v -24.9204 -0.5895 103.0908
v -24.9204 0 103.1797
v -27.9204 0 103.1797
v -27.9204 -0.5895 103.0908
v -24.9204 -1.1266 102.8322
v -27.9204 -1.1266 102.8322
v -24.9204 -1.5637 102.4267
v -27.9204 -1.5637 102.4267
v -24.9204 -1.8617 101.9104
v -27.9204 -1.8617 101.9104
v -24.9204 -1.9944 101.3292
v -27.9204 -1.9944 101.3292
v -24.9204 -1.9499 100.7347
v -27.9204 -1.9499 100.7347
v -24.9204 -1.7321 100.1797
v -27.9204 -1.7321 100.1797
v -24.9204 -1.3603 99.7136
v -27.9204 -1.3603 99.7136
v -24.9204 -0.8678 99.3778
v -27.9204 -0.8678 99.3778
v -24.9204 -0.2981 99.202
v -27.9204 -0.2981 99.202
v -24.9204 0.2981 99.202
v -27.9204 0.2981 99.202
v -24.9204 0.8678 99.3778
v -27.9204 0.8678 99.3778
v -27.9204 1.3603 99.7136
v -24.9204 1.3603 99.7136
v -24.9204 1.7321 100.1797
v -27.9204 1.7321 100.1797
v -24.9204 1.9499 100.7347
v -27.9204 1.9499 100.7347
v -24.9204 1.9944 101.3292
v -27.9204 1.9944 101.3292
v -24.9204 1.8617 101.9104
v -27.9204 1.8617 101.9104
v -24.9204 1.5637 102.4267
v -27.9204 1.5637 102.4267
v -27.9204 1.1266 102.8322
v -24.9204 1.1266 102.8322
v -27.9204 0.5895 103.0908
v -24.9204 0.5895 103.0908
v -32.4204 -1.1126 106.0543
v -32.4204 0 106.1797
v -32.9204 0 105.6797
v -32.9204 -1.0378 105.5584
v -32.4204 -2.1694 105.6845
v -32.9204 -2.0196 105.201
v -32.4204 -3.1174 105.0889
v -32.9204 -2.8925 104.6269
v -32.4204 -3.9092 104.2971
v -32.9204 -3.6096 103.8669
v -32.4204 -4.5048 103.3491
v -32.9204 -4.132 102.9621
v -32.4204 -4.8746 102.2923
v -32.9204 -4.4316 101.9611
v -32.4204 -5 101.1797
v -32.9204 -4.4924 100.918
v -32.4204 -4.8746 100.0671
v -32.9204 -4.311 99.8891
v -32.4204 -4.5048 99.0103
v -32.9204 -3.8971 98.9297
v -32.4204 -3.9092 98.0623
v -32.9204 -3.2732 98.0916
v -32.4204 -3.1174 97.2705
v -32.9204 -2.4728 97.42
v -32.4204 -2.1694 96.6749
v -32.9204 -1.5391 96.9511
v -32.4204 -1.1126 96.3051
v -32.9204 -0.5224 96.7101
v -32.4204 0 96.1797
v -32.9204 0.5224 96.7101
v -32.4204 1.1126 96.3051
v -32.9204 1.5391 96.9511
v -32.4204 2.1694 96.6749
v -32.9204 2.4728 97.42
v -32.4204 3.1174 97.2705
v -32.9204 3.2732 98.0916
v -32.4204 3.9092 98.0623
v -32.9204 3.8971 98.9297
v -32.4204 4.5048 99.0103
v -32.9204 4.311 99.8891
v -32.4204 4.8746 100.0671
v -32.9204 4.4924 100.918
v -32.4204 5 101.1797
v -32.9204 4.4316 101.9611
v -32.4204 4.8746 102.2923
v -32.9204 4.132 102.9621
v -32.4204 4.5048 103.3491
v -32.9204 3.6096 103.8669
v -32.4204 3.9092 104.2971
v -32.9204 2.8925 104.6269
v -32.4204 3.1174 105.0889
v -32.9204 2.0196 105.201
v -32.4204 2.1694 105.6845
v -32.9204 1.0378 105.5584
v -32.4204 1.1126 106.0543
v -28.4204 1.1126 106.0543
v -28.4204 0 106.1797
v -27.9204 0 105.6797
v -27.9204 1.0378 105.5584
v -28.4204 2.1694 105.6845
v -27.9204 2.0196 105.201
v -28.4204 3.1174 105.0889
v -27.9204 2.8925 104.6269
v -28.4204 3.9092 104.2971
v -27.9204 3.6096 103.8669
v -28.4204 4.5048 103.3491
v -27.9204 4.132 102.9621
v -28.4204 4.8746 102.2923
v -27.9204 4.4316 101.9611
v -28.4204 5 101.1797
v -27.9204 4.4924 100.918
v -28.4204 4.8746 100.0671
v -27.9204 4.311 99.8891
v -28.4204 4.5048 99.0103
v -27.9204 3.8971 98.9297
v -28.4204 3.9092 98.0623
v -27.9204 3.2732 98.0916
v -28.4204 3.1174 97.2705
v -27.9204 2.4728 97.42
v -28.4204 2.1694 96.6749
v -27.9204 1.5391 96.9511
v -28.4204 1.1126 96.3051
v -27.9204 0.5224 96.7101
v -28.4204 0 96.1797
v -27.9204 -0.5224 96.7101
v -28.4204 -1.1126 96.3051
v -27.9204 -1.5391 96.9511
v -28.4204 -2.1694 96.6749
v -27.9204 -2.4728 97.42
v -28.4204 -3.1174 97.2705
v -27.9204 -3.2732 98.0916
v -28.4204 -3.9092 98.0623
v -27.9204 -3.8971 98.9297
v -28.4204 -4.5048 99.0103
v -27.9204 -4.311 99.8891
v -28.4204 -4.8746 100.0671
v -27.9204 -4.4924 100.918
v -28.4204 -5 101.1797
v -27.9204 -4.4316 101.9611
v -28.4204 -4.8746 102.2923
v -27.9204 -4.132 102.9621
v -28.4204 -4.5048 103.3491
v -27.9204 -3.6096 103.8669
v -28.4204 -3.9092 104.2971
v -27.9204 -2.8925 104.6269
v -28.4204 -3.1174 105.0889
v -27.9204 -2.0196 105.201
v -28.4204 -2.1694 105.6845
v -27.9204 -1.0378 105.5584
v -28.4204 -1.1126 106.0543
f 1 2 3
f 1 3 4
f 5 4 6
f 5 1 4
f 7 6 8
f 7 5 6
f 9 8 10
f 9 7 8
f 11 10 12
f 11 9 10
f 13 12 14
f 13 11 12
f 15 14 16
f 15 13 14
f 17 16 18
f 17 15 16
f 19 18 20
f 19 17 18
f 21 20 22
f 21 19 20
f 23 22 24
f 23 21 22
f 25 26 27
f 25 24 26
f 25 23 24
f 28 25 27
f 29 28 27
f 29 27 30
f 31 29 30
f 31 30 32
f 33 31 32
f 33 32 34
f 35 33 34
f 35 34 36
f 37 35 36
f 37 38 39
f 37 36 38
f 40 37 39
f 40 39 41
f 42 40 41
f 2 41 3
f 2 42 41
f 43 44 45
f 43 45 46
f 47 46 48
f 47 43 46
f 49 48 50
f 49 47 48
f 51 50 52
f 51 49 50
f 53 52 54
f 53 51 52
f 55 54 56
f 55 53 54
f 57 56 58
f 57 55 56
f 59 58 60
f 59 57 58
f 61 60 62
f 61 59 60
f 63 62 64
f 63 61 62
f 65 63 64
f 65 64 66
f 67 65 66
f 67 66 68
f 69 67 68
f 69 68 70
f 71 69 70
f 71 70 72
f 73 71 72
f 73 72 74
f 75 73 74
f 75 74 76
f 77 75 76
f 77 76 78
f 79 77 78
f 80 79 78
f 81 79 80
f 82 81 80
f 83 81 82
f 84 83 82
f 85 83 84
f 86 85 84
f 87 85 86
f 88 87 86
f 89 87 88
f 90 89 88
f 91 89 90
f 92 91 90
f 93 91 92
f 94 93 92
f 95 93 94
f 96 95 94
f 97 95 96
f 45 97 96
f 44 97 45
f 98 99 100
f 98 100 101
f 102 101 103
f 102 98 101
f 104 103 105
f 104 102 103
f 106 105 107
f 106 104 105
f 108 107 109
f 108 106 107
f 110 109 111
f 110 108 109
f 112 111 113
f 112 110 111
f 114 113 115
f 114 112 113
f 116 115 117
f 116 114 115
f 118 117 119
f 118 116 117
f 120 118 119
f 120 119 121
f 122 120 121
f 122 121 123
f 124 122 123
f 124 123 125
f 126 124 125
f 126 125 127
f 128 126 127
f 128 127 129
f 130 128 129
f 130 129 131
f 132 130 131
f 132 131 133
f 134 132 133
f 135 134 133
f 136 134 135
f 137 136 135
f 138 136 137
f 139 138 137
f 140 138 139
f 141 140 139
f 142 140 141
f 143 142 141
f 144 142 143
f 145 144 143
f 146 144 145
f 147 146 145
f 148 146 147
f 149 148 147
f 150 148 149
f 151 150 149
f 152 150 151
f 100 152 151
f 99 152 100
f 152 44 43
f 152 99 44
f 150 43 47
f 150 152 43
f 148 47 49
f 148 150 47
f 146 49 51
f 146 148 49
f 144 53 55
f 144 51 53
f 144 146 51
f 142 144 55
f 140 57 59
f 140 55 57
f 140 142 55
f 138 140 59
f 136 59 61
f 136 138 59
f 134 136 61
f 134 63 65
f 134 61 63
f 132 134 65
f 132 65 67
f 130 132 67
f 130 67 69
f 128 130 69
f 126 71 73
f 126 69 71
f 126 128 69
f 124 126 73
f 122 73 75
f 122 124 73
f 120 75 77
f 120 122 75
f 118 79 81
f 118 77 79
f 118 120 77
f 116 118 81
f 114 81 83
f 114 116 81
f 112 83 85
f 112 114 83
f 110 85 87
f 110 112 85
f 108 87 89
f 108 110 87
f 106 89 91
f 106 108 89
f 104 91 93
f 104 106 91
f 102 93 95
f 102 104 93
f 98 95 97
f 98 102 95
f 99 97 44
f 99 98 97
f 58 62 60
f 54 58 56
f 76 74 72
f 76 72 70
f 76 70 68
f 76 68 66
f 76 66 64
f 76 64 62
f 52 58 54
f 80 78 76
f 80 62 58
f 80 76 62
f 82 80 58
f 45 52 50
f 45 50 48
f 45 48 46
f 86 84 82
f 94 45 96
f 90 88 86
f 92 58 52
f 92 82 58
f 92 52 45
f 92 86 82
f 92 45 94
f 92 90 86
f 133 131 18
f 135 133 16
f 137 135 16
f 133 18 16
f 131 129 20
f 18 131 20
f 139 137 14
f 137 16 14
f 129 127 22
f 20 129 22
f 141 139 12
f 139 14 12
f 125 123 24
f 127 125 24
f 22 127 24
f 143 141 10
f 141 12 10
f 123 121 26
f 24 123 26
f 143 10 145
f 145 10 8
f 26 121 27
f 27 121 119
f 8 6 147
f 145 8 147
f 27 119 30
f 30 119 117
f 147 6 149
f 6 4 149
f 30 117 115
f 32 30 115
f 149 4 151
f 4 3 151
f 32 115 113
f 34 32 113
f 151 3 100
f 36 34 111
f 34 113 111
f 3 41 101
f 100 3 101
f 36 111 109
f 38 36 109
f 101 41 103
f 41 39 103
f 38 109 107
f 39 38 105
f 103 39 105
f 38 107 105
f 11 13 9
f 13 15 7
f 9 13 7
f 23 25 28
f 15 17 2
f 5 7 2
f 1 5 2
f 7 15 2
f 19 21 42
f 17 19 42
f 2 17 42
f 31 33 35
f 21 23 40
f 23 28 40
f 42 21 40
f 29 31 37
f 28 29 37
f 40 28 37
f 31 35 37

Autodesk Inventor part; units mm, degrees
ref_plane "YZ Plane" through (0, 0, 0) normal (1, 0, 0) x (0, 1, 0)
ref_plane "XZ Plane" through (0, 0, 0) normal (0, 1, 0) x (-1, 0, 0)
ref_plane "XY Plane" through (0, 0, 0) normal (0, 0, 1) x (1, 0, 0)
sketch "スケッチ1" plane through (0, 0, 0) normal (0, 1, 0) x (-1, 0, 0)
  line L0 (-5.0796, -45.5704) -> (-5.0796, 73.9296)
  line L1 (-5.0796, 73.9296) -> (-4.5796, 74.4296)
  line L2 (-4.5796, 74.4296) -> (24.4204, 74.4296)
  line L3 (24.4204, 74.4296) -> (24.9204, 73.9296)
  line L4 (24.9204, 73.9296) -> (24.9204, -45.5704)
  line L5 (24.9204, -45.5704) -> (-5.0796, -45.5704)
  line L6 (1.9204, -47.0704) -> (1.9204, -50.5704)
  line L7 (1.9204, -50.5704) -> (17.9204, -50.5704)
  line L8 (17.9204, -50.5704) -> (17.9204, -47.0704)
  line L9 (17.9204, -47.0704) -> (1.9204, -47.0704)
  line L10 (2.9204, -47.0704) -> (2.9204, -45.5704)
  line L11 (16.9204, -45.5704) -> (16.9204, -47.0704)
  line L12 (31.4204, 56.4296) -> (30.9204, 56.9296)
  line L13 (30.9204, 56.9296) -> (30.9204, 71.9296)
  line L14 (30.9204, 71.9296) -> (31.4204, 72.4296)
  line L15 (31.4204, 72.4296) -> (38.4204, 72.4296)
  line L16 (38.4204, 72.4296) -> (38.9204, 71.9296)
  line L17 (38.9204, 71.9296) -> (38.9204, 56.9296)
  line L18 (38.9204, 56.9296) -> (38.4204, 56.4296)
  line L19 (38.4204, 56.4296) -> (31.4204, 56.4296)
  line L20 (31.4204, 56.4296) -> (31.4204, 72.4296)
  line L21 (30.9204, 70.4296) -> (27.9204, 70.4296)
  line L22 (27.9204, 70.4296) -> (27.9204, 58.4296)
  line L23 (27.9204, 58.4296) -> (30.9204, 58.4296)
  line L24 (38.4204, 56.4296) -> (38.4204, 72.4296)
  line L25 (27.9204, 66.9296) -> (24.9204, 66.9296)
  line L26 (27.4204, 66.9296) -> (27.4204, 61.9296)
  line L27 (27.9204, 61.9296) -> (24.9204, 61.9296)
  line L28 (24.9204, 73.9296) -> (-5.0796, 73.9296)
  line L29 (-5.0796, 97.1797) -> (24.9204, 97.1797)
  line L30 (24.9204, 97.1797) -> (24.9204, 105.1797)
  line L31 (24.9204, 105.1797) -> (-5.0796, 105.1797)
  line L32 (-5.0796, 105.1797) -> (-5.0796, 97.1797)
  line L33 (24.9204, 99.1797) -> (27.9204, 99.1797)
  line L34 (27.2723, 99.1797) -> (27.2723, 103.1797)
  line L35 (27.9204, 103.1797) -> (24.9204, 103.1797)
  line L36 (27.9204, 105.6797) -> (27.9204, 96.6797)
  line L37 (27.9204, 96.6797) -> (28.4204, 96.1797)
  line L38 (28.4204, 96.1797) -> (32.4204, 96.1797)
  line L39 (32.4204, 96.1797) -> (32.9204, 96.6797)
  line L40 (32.9204, 96.6797) -> (32.9204, 105.6797)
  line L41 (32.9204, 105.6797) -> (32.4204, 106.1797)
  line L42 (32.4204, 106.1797) -> (28.4204, 106.1797)
  line L43 (28.4204, 106.1797) -> (27.9204, 105.6797)
  line L44 (28.4204, 106.1797) -> (28.4204, 96.1797)
  line L45 (32.4204, 96.1797) -> (32.4204, 106.1797)
  line L46 (2.4204, -50.5704) -> (2.4204, -47.0704)
  line L47 (-0.0796, -40.5704) -> (-0.0796, 74.4296)
  line L48 (19.9204, 74.4296) -> (19.9204, -40.5704)
  line L49 (19.9204, -40.5704) -> (9.9204, -46.3439)
  line L50 (9.9204, -46.3439) -> (-0.0796, -40.5704)
  line L51 (-0.0796, -40.5704) -> (19.9204, -40.5704)
  line L52 (17.4204, -47.0704) -> (17.4204, -50.5704)
  line L53 (9.9204, -56.5156) -> (9.9204, 78.76)
  line L54 (9.9204, 93.5864) -> (9.9204, 108.5157)
  line L55 (19.9204, 105.1797) -> (19.9204, 97.1797)
  line L56 (22.5096, 101.1797) -> (35.2156, 101.1797)
  line L57 (27.9204, 103.1797) -> (27.2723, 102.4797)
  line L58 (27.2723, 102.4797) -> (24.9204, 102.4797)
  line L59 (24.9204, 99.8797) -> (27.2723, 99.8797)
  line L60 (27.2723, 99.8797) -> (27.9204, 99.1797)
  line L61 (-0.0796, 97.1797) -> (-0.0796, 105.1797)
  line L62 (24.9204, 66.2296) -> (27.4204, 66.2296)
  line L63 (27.4204, 66.2296) -> (27.9204, 66.9296)
  line L64 (27.4204, 62.6296) -> (27.9204, 61.9296)
  line L65 (27.4204, 62.6296) -> (24.9204, 62.6296)
  line L66 (22.6428, 64.4296) -> (42.5049, 64.4296)
  line L67 (32.2954, 71.4296) -> (38.4204, 71.4296)
  line L68 (33.1704, 70.4296) -> (38.4204, 70.4296)
  line L69 (34.0454, 69.4296) -> (38.4204, 69.4296)
  line L70 (34.9204, 68.4296) -> (38.4204, 68.4296)
  line L71 (35.7954, 67.4296) -> (38.4204, 67.4296)
  line L72 (36.6704, 66.4296) -> (38.4204, 66.4296)
  line L73 (37.5454, 65.4296) -> (38.4204, 65.4296)
  line L74 (29.2204, 105.1797) -> (32.4204, 105.1797)
  line L75 (30.0204, 104.1797) -> (32.4204, 104.1797)
  line L76 (30.8204, 103.1797) -> (32.4204, 103.1797)
  line L77 (31.6204, 102.1797) -> (32.4204, 102.1797)
  point P0 (0, 0)
  point P1 (52.3578, -69.094)
  point P2 (52.3578, -59.2279)
  point P3 (24.9204, 101.1797)
  point P4 (32.9204, 101.1797)
revolve "回転1" add sketch "スケッチ1" angle 360 about axis through (-22.5096, 0, 101.1797) along (-1, 0, 0) contours L35 L34 L58 L30 | L30 L58 L34 L56 | L35 L57 L34 | L34 L57 L36 L56 | L36 L43 L44 L56 | L44 L42 L45 L56 | L45 L41 L40 L56
thread "ねじ1" size "M4x0.7" class "6g" standard "ANSI Metric M Profile" full length
properties part number "ring_handle" material "アルミニウム 6061"
